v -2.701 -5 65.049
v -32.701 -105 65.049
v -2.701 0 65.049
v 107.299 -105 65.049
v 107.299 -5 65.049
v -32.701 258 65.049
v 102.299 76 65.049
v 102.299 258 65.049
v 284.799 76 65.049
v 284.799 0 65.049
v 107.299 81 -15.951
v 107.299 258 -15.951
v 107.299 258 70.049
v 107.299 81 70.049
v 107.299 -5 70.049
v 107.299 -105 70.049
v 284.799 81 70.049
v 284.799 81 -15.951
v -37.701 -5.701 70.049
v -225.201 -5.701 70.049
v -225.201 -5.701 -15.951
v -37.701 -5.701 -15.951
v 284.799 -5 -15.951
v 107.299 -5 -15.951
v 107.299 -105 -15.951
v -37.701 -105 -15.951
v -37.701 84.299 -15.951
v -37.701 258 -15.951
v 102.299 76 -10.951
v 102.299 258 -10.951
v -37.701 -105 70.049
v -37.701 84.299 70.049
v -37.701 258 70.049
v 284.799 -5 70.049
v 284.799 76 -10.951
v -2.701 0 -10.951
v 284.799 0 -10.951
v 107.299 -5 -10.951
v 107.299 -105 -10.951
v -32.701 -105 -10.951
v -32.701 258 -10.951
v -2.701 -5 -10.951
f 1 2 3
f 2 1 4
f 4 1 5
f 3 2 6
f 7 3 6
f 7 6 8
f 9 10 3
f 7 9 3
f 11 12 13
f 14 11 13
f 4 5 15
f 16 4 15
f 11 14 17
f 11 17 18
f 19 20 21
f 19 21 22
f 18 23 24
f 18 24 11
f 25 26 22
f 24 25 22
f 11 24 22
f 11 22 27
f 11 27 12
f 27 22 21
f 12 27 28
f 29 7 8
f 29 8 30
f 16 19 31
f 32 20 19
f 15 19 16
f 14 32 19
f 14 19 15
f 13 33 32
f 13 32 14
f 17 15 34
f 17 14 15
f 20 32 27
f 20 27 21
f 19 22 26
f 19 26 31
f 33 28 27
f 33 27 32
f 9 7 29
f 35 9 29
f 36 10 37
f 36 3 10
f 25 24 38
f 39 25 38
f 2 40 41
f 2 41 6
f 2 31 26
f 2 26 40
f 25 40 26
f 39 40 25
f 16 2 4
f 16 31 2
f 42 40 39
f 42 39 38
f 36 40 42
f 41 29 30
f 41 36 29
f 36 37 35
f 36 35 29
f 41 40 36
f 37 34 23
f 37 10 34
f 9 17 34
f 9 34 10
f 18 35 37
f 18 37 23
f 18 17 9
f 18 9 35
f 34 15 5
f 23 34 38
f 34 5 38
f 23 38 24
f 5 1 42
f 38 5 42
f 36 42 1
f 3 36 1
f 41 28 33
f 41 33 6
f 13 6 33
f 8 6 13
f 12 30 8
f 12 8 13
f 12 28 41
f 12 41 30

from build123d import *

# Parameters (mm, degrees)
ESQUISSE1_W             = 145
ESQUISSE1_H             = 86
ESQUISSE1_W_2           = 135
ESQUISSE1_H_2           = 76
BOSS_EXTRU_1_DEPTH      = 258
ESQUISSE2_W             = 145
ESQUISSE2_H             = 86
BOSS_EXTRU_2_DEPTH      = 5
ESQUISSE3_W             = 30
ESQUISSE3_H             = 76
ENL_V_MAT_EXTRU_1_DEPTH = 5
ESQUISSE5_W             = 5
ESQUISSE5_H             = 86
BOSS_EXTRU_3_DEPTH      = 100
BOSS_EXTRU_6_DEPTH      = 86
ESQUISSE10_W            = 86
ESQUISSE10_H            = 86
ESQUISSE10_W_2          = 76
ESQUISSE10_H_2          = 76
BOSS_EXTRU_7_DEPTH      = 177.5
ESQUISSE11_W            = 76
ESQUISSE11_H            = 76
ENL_V_MAT_EXTRU_2_DEPTH = 10
ESQUISSE12_W            = 140
ESQUISSE12_H            = 5
BOSS_EXTRU_8_DEPTH      = 100


with BuildPart() as part:
    # Esquisse1 → Boss.-Extru.1 (new body)
    with BuildSketch(Plane(origin=(0, 0, 0), x_dir=(1, 0, 0), z_dir=(0, 1, 0))):
        with Locations((34.799005462, -27.04875873)):
            Rectangle(ESQUISSE1_W, ESQUISSE1_H)
        with Locations((34.799005462, -27.04875873)):
            Rectangle(ESQUISSE1_W_2, ESQUISSE1_H_2, mode=Mode.SUBTRACT)
    extrude(amount=BOSS_EXTRU_1_DEPTH)

    # Esquisse2 → Boss.-Extru.2 (add)
    with BuildSketch(Plane.XZ):
        with Locations((34.799005462, 27.04875873)):
            Rectangle(ESQUISSE2_W, ESQUISSE2_H)
    extrude(amount=BOSS_EXTRU_2_DEPTH)

    # Esquisse3 → Enlèv. mat.-Extru.1 (cut)
    with BuildSketch(Plane.XZ.offset(5)):
        with Locations((-17.700994538, 27.04875873)):
            Rectangle(ESQUISSE3_W, ESQUISSE3_H)
    extrude(amount=-ENL_V_MAT_EXTRU_1_DEPTH, mode=Mode.SUBTRACT)

    # Esquisse5 → Boss.-Extru.3 (add)
    with BuildSketch(Plane.XZ.offset(5)):
        with Locations((-35.200994538, 27.04875873)):
            Rectangle(ESQUISSE5_W, ESQUISSE5_H)
    extrude(amount=BOSS_EXTRU_3_DEPTH)

    # Esquisse9 → Boss.-Extru.6 (add)
    with BuildSketch(Plane.XY.offset(70.04875873)):
        Polygon((-37.700994538, -5.700514768), (-37.700994538, 84.299485232), (-225.200994538, -5.700514768), align=None)
    extrude(amount=-BOSS_EXTRU_6_DEPTH)

    # Esquisse10 → Boss.-Extru.7 (add)
    with BuildSketch(Plane(origin=(107.299005462, 0, 0), x_dir=(0, 0, -1), z_dir=(1, 0, 0))):
        with Locations((-27.04875873, 38)):
            Rectangle(ESQUISSE10_W, ESQUISSE10_H)
        with Locations((-27.04875873, 38)):
            Rectangle(ESQUISSE10_W_2, ESQUISSE10_H_2, mode=Mode.SUBTRACT)
    extrude(amount=BOSS_EXTRU_7_DEPTH)

    # Esquisse11 → Enlèv. mat.-Extru.2 (cut)
    with BuildSketch(Plane(origin=(107.299005462, 0, 0), x_dir=(0, 0, -1), z_dir=(1, 0, 0))):
        with Locations((-27.04875873, 38)):
            Rectangle(ESQUISSE11_W, ESQUISSE11_H)
    extrude(amount=-ENL_V_MAT_EXTRU_2_DEPTH, mode=Mode.SUBTRACT)

    # Esquisse12 → Boss.-Extru.8 (add)
    with BuildSketch(Plane.XZ.offset(5)):
        with Locations((37.299005462, 67.54875873)):
            Rectangle(ESQUISSE12_W, ESQUISSE12_H)
        with Locations((37.299005462, -13.45124127)):
            Rectangle(ESQUISSE12_W, ESQUISSE12_H)
    extrude(amount=BOSS_EXTRU_8_DEPTH)


solid = part.part
